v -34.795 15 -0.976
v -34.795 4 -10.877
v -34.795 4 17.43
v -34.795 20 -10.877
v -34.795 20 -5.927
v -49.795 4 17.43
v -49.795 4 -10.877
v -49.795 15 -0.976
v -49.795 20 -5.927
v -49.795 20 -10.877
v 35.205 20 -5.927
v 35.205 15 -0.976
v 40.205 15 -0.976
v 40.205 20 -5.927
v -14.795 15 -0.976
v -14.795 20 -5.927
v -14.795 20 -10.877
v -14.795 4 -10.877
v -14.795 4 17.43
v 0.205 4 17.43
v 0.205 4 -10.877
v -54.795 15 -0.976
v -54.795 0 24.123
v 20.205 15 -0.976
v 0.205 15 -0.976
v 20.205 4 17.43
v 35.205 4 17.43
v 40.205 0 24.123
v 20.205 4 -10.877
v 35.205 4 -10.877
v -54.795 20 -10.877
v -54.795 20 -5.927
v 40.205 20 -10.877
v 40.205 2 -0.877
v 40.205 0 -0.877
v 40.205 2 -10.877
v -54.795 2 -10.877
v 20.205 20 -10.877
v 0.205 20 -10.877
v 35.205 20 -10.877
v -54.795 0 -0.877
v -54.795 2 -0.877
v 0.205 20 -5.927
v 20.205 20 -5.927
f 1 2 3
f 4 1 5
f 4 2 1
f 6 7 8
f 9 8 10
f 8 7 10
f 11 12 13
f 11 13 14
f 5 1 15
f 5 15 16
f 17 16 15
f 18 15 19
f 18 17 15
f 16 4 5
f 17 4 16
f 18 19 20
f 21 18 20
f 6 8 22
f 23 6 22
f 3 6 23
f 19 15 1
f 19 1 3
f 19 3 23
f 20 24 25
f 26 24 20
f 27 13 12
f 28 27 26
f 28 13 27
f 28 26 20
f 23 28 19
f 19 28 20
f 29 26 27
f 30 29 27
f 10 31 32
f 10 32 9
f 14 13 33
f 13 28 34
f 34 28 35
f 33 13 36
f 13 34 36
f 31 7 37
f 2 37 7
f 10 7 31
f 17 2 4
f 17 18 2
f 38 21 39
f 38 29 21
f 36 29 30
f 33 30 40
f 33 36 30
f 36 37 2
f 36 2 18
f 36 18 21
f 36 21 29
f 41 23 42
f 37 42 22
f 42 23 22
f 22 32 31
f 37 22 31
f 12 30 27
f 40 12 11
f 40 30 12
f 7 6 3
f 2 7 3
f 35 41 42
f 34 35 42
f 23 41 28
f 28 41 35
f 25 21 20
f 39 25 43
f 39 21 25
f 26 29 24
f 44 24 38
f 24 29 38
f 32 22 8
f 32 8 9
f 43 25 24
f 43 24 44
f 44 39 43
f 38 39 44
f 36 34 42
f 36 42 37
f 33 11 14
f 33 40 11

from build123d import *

# Parameters (mm, degrees)
CROQUIS1_W              = 100
CROQUIS1_H              = 85
SALIENTE_EXTRUIR1_DEPTH = 20
CORTAR_EXTRUIR1_REACH   = 102
CORTAR_EXTRUIR2_REACH   = 102
CORTAR_EXTRUIR6_DEPTH   = 5
CROQUIS11_W             = 15
CROQUIS11_H             = 16
CORTAR_EXTRUIR7_DEPTH   = 44
CROQUIS12_W             = 5
CROQUIS12_H             = 49.877192982
CORTAR_EXTRUIR8_DEPTH   = 44
CORTAR_EXTRUIR9_REACH   = 97
CROQUIS13_W             = 50
CROQUIS13_H             = 18
CROQUIS14_W             = 9.804862201
CROQUIS14_H             = 2
CORTAR_EXTRUIR10_DEPTH  = 121
CORTAR_EXTRUIR11_REACH  = 97
CORTAR_EXTRUIR12_REACH  = 97
CORTAR_EXTRUIR13_DEPTH  = 96


with BuildPart() as part:
    # Croquis1 → Saliente-Extruir1 (new body)
    with BuildSketch(Plane(origin=(0, 0, 0), x_dir=(1, 0, 0), z_dir=(0, 1, 0))):
        with Locations((-9.795321637, 18.377192982)):
            Rectangle(CROQUIS1_W, CROQUIS1_H)
    extrude(amount=SALIENTE_EXTRUIR1_DEPTH)

    # Croquis3 → Cortar-Extruir1 (cut, up to next)
    with BuildSketch(Plane(origin=(40.204678363, 0, 0), x_dir=(0, 0, -1), z_dir=(1, 0, 0)), mode=Mode.PRIVATE) as cortar_extruir1_sk1:
        Polygon((-24.122807018, 0), (0.976475977, 20), (-24.122807018, 20), align=None)
    cortar_extruir1_tool1 = extrude(cortar_extruir1_sk1.sketch, amount=-CORTAR_EXTRUIR1_REACH, mode=Mode.PRIVATE) & part.part
    add(cortar_extruir1_tool1.solids().sort_by_distance((40.204678, 13.333333, 15.756379))[0], mode=Mode.SUBTRACT)

    # Croquis4 → Cortar-Extruir2 (cut, up to next)
    with BuildSketch(Plane(origin=(40.204678363, 0, 0), x_dir=(0, 0, -1), z_dir=(1, 0, 0)), mode=Mode.PRIVATE) as cortar_extruir2_sk1:
        Polygon((0.976475977, 20), (0.976475977, 15), (-24.122807018, 0), align=None)
    cortar_extruir2_tool1 = extrude(cortar_extruir2_sk1.sketch, amount=-CORTAR_EXTRUIR2_REACH, mode=Mode.PRIVATE) & part.part
    add(cortar_extruir2_tool1.solids().sort_by_distance((40.204678, 11.666667, 7.389952))[0], mode=Mode.SUBTRACT)

    # Croquis8 → Cortar-Extruir6 (cut)
    with BuildSketch(Plane.ZY.offset(59.795321637)):
        Polygon((-11, 20), (-0.976475977, 20), (-0.976475977, 15), (24.122807018, 0), (-11, 0), align=None)
    extrude(amount=-CORTAR_EXTRUIR6_DEPTH, mode=Mode.SUBTRACT)

    # Croquis11 → Cortar-Extruir7 (cut)
    with BuildSketch(Plane.XY.offset(-11)):
        with Locations((27.704678363, 12)):
            Rectangle(CROQUIS11_W, CROQUIS11_H)
        Polygon((0.204678363, 20), (-14.795321637, 20), (-14.795321637, 4), (0.204678363, 4), (0.204678363, 18.881828366), align=None)
        with Locations((-42.295321637, 12)):
            Rectangle(CROQUIS11_W, CROQUIS11_H)
    extrude(amount=CORTAR_EXTRUIR7_DEPTH, mode=Mode.SUBTRACT)

    # Croquis12 → Cortar-Extruir8 (cut)
    with BuildSketch(Plane(origin=(0, 20, 0), x_dir=(1, 0, 0), z_dir=(0, 1, 0))):
        with Locations((-57.295321637, 35.938596491)):
            Rectangle(CROQUIS12_W, CROQUIS12_H)
    extrude(amount=-CORTAR_EXTRUIR8_DEPTH, mode=Mode.SUBTRACT)

    # Croquis13 → Cortar-Extruir9 (cut, up to next)
    with BuildSketch(Plane(origin=(40.204678363, 0, 0), x_dir=(0, 0, -1), z_dir=(1, 0, 0)), mode=Mode.PRIVATE) as cortar_extruir9_sk1:
        with Locations((35.877192982, 11)):
            Rectangle(CROQUIS13_W, CROQUIS13_H)
    cortar_extruir9_tool1 = extrude(cortar_extruir9_sk1.sketch, amount=-CORTAR_EXTRUIR9_REACH, mode=Mode.PRIVATE) & part.part
    add(cortar_extruir9_tool1.solids().sort_by_distance((40.204678, 11, -35.877193))[0], mode=Mode.SUBTRACT)

    # Croquis14 → Cortar-Extruir10 (cut)
    with BuildSketch(Plane(origin=(40.204678363, 0, 0), x_dir=(0, 0, -1), z_dir=(1, 0, 0))):
        with Locations((5.779624083, 1)):
            Rectangle(CROQUIS14_W, CROQUIS14_H)
    extrude(amount=-CORTAR_EXTRUIR10_DEPTH, mode=Mode.SUBTRACT)

    # Croquis17 → Cortar-Extruir11 (cut, up to next)
    with BuildSketch(Plane(origin=(40.204678363, 0, 0), x_dir=(0, 0, -1), z_dir=(1, 0, 0)), mode=Mode.PRIVATE) as cortar_extruir11_sk1:
        Polygon((10.877192982, 2), (10.682055183, 0), (60.877192982, 0), (60.877192982, 2), align=None)
    cortar_extruir11_tool1 = extrude(cortar_extruir11_sk1.sketch, amount=-CORTAR_EXTRUIR11_REACH, mode=Mode.PRIVATE) & part.part
    add(cortar_extruir11_tool1.solids().sort_by_distance((40.204678, 0.999351, -35.828377))[0], mode=Mode.SUBTRACT)

    # Croquis18 → Cortar-Extruir12 (cut, up to next)
    with BuildSketch(Plane(origin=(40.204678363, 0, 0), x_dir=(0, 0, -1), z_dir=(1, 0, 0)), mode=Mode.PRIVATE) as cortar_extruir12_sk1:
        Polygon((10.682055183, 2), (10.877192982, 2), (10.682055183, 0), align=None)
    cortar_extruir12_tool1 = extrude(cortar_extruir12_sk1.sketch, amount=-CORTAR_EXTRUIR12_REACH, mode=Mode.PRIVATE) & part.part
    add(cortar_extruir12_tool1.solids().sort_by_distance((40.204678, 1.333333, -10.747101))[0], mode=Mode.SUBTRACT)

    # Croquis19 → Cortar-Extruir13 (cut)
    with BuildSketch(Plane.ZY.offset(54.795321637)):
        Polygon((-0.976475977, 15), (-5.92683448, 20), (-0.976475977, 20), align=None)
    extrude(amount=-CORTAR_EXTRUIR13_DEPTH, mode=Mode.SUBTRACT)


solid = part.part
